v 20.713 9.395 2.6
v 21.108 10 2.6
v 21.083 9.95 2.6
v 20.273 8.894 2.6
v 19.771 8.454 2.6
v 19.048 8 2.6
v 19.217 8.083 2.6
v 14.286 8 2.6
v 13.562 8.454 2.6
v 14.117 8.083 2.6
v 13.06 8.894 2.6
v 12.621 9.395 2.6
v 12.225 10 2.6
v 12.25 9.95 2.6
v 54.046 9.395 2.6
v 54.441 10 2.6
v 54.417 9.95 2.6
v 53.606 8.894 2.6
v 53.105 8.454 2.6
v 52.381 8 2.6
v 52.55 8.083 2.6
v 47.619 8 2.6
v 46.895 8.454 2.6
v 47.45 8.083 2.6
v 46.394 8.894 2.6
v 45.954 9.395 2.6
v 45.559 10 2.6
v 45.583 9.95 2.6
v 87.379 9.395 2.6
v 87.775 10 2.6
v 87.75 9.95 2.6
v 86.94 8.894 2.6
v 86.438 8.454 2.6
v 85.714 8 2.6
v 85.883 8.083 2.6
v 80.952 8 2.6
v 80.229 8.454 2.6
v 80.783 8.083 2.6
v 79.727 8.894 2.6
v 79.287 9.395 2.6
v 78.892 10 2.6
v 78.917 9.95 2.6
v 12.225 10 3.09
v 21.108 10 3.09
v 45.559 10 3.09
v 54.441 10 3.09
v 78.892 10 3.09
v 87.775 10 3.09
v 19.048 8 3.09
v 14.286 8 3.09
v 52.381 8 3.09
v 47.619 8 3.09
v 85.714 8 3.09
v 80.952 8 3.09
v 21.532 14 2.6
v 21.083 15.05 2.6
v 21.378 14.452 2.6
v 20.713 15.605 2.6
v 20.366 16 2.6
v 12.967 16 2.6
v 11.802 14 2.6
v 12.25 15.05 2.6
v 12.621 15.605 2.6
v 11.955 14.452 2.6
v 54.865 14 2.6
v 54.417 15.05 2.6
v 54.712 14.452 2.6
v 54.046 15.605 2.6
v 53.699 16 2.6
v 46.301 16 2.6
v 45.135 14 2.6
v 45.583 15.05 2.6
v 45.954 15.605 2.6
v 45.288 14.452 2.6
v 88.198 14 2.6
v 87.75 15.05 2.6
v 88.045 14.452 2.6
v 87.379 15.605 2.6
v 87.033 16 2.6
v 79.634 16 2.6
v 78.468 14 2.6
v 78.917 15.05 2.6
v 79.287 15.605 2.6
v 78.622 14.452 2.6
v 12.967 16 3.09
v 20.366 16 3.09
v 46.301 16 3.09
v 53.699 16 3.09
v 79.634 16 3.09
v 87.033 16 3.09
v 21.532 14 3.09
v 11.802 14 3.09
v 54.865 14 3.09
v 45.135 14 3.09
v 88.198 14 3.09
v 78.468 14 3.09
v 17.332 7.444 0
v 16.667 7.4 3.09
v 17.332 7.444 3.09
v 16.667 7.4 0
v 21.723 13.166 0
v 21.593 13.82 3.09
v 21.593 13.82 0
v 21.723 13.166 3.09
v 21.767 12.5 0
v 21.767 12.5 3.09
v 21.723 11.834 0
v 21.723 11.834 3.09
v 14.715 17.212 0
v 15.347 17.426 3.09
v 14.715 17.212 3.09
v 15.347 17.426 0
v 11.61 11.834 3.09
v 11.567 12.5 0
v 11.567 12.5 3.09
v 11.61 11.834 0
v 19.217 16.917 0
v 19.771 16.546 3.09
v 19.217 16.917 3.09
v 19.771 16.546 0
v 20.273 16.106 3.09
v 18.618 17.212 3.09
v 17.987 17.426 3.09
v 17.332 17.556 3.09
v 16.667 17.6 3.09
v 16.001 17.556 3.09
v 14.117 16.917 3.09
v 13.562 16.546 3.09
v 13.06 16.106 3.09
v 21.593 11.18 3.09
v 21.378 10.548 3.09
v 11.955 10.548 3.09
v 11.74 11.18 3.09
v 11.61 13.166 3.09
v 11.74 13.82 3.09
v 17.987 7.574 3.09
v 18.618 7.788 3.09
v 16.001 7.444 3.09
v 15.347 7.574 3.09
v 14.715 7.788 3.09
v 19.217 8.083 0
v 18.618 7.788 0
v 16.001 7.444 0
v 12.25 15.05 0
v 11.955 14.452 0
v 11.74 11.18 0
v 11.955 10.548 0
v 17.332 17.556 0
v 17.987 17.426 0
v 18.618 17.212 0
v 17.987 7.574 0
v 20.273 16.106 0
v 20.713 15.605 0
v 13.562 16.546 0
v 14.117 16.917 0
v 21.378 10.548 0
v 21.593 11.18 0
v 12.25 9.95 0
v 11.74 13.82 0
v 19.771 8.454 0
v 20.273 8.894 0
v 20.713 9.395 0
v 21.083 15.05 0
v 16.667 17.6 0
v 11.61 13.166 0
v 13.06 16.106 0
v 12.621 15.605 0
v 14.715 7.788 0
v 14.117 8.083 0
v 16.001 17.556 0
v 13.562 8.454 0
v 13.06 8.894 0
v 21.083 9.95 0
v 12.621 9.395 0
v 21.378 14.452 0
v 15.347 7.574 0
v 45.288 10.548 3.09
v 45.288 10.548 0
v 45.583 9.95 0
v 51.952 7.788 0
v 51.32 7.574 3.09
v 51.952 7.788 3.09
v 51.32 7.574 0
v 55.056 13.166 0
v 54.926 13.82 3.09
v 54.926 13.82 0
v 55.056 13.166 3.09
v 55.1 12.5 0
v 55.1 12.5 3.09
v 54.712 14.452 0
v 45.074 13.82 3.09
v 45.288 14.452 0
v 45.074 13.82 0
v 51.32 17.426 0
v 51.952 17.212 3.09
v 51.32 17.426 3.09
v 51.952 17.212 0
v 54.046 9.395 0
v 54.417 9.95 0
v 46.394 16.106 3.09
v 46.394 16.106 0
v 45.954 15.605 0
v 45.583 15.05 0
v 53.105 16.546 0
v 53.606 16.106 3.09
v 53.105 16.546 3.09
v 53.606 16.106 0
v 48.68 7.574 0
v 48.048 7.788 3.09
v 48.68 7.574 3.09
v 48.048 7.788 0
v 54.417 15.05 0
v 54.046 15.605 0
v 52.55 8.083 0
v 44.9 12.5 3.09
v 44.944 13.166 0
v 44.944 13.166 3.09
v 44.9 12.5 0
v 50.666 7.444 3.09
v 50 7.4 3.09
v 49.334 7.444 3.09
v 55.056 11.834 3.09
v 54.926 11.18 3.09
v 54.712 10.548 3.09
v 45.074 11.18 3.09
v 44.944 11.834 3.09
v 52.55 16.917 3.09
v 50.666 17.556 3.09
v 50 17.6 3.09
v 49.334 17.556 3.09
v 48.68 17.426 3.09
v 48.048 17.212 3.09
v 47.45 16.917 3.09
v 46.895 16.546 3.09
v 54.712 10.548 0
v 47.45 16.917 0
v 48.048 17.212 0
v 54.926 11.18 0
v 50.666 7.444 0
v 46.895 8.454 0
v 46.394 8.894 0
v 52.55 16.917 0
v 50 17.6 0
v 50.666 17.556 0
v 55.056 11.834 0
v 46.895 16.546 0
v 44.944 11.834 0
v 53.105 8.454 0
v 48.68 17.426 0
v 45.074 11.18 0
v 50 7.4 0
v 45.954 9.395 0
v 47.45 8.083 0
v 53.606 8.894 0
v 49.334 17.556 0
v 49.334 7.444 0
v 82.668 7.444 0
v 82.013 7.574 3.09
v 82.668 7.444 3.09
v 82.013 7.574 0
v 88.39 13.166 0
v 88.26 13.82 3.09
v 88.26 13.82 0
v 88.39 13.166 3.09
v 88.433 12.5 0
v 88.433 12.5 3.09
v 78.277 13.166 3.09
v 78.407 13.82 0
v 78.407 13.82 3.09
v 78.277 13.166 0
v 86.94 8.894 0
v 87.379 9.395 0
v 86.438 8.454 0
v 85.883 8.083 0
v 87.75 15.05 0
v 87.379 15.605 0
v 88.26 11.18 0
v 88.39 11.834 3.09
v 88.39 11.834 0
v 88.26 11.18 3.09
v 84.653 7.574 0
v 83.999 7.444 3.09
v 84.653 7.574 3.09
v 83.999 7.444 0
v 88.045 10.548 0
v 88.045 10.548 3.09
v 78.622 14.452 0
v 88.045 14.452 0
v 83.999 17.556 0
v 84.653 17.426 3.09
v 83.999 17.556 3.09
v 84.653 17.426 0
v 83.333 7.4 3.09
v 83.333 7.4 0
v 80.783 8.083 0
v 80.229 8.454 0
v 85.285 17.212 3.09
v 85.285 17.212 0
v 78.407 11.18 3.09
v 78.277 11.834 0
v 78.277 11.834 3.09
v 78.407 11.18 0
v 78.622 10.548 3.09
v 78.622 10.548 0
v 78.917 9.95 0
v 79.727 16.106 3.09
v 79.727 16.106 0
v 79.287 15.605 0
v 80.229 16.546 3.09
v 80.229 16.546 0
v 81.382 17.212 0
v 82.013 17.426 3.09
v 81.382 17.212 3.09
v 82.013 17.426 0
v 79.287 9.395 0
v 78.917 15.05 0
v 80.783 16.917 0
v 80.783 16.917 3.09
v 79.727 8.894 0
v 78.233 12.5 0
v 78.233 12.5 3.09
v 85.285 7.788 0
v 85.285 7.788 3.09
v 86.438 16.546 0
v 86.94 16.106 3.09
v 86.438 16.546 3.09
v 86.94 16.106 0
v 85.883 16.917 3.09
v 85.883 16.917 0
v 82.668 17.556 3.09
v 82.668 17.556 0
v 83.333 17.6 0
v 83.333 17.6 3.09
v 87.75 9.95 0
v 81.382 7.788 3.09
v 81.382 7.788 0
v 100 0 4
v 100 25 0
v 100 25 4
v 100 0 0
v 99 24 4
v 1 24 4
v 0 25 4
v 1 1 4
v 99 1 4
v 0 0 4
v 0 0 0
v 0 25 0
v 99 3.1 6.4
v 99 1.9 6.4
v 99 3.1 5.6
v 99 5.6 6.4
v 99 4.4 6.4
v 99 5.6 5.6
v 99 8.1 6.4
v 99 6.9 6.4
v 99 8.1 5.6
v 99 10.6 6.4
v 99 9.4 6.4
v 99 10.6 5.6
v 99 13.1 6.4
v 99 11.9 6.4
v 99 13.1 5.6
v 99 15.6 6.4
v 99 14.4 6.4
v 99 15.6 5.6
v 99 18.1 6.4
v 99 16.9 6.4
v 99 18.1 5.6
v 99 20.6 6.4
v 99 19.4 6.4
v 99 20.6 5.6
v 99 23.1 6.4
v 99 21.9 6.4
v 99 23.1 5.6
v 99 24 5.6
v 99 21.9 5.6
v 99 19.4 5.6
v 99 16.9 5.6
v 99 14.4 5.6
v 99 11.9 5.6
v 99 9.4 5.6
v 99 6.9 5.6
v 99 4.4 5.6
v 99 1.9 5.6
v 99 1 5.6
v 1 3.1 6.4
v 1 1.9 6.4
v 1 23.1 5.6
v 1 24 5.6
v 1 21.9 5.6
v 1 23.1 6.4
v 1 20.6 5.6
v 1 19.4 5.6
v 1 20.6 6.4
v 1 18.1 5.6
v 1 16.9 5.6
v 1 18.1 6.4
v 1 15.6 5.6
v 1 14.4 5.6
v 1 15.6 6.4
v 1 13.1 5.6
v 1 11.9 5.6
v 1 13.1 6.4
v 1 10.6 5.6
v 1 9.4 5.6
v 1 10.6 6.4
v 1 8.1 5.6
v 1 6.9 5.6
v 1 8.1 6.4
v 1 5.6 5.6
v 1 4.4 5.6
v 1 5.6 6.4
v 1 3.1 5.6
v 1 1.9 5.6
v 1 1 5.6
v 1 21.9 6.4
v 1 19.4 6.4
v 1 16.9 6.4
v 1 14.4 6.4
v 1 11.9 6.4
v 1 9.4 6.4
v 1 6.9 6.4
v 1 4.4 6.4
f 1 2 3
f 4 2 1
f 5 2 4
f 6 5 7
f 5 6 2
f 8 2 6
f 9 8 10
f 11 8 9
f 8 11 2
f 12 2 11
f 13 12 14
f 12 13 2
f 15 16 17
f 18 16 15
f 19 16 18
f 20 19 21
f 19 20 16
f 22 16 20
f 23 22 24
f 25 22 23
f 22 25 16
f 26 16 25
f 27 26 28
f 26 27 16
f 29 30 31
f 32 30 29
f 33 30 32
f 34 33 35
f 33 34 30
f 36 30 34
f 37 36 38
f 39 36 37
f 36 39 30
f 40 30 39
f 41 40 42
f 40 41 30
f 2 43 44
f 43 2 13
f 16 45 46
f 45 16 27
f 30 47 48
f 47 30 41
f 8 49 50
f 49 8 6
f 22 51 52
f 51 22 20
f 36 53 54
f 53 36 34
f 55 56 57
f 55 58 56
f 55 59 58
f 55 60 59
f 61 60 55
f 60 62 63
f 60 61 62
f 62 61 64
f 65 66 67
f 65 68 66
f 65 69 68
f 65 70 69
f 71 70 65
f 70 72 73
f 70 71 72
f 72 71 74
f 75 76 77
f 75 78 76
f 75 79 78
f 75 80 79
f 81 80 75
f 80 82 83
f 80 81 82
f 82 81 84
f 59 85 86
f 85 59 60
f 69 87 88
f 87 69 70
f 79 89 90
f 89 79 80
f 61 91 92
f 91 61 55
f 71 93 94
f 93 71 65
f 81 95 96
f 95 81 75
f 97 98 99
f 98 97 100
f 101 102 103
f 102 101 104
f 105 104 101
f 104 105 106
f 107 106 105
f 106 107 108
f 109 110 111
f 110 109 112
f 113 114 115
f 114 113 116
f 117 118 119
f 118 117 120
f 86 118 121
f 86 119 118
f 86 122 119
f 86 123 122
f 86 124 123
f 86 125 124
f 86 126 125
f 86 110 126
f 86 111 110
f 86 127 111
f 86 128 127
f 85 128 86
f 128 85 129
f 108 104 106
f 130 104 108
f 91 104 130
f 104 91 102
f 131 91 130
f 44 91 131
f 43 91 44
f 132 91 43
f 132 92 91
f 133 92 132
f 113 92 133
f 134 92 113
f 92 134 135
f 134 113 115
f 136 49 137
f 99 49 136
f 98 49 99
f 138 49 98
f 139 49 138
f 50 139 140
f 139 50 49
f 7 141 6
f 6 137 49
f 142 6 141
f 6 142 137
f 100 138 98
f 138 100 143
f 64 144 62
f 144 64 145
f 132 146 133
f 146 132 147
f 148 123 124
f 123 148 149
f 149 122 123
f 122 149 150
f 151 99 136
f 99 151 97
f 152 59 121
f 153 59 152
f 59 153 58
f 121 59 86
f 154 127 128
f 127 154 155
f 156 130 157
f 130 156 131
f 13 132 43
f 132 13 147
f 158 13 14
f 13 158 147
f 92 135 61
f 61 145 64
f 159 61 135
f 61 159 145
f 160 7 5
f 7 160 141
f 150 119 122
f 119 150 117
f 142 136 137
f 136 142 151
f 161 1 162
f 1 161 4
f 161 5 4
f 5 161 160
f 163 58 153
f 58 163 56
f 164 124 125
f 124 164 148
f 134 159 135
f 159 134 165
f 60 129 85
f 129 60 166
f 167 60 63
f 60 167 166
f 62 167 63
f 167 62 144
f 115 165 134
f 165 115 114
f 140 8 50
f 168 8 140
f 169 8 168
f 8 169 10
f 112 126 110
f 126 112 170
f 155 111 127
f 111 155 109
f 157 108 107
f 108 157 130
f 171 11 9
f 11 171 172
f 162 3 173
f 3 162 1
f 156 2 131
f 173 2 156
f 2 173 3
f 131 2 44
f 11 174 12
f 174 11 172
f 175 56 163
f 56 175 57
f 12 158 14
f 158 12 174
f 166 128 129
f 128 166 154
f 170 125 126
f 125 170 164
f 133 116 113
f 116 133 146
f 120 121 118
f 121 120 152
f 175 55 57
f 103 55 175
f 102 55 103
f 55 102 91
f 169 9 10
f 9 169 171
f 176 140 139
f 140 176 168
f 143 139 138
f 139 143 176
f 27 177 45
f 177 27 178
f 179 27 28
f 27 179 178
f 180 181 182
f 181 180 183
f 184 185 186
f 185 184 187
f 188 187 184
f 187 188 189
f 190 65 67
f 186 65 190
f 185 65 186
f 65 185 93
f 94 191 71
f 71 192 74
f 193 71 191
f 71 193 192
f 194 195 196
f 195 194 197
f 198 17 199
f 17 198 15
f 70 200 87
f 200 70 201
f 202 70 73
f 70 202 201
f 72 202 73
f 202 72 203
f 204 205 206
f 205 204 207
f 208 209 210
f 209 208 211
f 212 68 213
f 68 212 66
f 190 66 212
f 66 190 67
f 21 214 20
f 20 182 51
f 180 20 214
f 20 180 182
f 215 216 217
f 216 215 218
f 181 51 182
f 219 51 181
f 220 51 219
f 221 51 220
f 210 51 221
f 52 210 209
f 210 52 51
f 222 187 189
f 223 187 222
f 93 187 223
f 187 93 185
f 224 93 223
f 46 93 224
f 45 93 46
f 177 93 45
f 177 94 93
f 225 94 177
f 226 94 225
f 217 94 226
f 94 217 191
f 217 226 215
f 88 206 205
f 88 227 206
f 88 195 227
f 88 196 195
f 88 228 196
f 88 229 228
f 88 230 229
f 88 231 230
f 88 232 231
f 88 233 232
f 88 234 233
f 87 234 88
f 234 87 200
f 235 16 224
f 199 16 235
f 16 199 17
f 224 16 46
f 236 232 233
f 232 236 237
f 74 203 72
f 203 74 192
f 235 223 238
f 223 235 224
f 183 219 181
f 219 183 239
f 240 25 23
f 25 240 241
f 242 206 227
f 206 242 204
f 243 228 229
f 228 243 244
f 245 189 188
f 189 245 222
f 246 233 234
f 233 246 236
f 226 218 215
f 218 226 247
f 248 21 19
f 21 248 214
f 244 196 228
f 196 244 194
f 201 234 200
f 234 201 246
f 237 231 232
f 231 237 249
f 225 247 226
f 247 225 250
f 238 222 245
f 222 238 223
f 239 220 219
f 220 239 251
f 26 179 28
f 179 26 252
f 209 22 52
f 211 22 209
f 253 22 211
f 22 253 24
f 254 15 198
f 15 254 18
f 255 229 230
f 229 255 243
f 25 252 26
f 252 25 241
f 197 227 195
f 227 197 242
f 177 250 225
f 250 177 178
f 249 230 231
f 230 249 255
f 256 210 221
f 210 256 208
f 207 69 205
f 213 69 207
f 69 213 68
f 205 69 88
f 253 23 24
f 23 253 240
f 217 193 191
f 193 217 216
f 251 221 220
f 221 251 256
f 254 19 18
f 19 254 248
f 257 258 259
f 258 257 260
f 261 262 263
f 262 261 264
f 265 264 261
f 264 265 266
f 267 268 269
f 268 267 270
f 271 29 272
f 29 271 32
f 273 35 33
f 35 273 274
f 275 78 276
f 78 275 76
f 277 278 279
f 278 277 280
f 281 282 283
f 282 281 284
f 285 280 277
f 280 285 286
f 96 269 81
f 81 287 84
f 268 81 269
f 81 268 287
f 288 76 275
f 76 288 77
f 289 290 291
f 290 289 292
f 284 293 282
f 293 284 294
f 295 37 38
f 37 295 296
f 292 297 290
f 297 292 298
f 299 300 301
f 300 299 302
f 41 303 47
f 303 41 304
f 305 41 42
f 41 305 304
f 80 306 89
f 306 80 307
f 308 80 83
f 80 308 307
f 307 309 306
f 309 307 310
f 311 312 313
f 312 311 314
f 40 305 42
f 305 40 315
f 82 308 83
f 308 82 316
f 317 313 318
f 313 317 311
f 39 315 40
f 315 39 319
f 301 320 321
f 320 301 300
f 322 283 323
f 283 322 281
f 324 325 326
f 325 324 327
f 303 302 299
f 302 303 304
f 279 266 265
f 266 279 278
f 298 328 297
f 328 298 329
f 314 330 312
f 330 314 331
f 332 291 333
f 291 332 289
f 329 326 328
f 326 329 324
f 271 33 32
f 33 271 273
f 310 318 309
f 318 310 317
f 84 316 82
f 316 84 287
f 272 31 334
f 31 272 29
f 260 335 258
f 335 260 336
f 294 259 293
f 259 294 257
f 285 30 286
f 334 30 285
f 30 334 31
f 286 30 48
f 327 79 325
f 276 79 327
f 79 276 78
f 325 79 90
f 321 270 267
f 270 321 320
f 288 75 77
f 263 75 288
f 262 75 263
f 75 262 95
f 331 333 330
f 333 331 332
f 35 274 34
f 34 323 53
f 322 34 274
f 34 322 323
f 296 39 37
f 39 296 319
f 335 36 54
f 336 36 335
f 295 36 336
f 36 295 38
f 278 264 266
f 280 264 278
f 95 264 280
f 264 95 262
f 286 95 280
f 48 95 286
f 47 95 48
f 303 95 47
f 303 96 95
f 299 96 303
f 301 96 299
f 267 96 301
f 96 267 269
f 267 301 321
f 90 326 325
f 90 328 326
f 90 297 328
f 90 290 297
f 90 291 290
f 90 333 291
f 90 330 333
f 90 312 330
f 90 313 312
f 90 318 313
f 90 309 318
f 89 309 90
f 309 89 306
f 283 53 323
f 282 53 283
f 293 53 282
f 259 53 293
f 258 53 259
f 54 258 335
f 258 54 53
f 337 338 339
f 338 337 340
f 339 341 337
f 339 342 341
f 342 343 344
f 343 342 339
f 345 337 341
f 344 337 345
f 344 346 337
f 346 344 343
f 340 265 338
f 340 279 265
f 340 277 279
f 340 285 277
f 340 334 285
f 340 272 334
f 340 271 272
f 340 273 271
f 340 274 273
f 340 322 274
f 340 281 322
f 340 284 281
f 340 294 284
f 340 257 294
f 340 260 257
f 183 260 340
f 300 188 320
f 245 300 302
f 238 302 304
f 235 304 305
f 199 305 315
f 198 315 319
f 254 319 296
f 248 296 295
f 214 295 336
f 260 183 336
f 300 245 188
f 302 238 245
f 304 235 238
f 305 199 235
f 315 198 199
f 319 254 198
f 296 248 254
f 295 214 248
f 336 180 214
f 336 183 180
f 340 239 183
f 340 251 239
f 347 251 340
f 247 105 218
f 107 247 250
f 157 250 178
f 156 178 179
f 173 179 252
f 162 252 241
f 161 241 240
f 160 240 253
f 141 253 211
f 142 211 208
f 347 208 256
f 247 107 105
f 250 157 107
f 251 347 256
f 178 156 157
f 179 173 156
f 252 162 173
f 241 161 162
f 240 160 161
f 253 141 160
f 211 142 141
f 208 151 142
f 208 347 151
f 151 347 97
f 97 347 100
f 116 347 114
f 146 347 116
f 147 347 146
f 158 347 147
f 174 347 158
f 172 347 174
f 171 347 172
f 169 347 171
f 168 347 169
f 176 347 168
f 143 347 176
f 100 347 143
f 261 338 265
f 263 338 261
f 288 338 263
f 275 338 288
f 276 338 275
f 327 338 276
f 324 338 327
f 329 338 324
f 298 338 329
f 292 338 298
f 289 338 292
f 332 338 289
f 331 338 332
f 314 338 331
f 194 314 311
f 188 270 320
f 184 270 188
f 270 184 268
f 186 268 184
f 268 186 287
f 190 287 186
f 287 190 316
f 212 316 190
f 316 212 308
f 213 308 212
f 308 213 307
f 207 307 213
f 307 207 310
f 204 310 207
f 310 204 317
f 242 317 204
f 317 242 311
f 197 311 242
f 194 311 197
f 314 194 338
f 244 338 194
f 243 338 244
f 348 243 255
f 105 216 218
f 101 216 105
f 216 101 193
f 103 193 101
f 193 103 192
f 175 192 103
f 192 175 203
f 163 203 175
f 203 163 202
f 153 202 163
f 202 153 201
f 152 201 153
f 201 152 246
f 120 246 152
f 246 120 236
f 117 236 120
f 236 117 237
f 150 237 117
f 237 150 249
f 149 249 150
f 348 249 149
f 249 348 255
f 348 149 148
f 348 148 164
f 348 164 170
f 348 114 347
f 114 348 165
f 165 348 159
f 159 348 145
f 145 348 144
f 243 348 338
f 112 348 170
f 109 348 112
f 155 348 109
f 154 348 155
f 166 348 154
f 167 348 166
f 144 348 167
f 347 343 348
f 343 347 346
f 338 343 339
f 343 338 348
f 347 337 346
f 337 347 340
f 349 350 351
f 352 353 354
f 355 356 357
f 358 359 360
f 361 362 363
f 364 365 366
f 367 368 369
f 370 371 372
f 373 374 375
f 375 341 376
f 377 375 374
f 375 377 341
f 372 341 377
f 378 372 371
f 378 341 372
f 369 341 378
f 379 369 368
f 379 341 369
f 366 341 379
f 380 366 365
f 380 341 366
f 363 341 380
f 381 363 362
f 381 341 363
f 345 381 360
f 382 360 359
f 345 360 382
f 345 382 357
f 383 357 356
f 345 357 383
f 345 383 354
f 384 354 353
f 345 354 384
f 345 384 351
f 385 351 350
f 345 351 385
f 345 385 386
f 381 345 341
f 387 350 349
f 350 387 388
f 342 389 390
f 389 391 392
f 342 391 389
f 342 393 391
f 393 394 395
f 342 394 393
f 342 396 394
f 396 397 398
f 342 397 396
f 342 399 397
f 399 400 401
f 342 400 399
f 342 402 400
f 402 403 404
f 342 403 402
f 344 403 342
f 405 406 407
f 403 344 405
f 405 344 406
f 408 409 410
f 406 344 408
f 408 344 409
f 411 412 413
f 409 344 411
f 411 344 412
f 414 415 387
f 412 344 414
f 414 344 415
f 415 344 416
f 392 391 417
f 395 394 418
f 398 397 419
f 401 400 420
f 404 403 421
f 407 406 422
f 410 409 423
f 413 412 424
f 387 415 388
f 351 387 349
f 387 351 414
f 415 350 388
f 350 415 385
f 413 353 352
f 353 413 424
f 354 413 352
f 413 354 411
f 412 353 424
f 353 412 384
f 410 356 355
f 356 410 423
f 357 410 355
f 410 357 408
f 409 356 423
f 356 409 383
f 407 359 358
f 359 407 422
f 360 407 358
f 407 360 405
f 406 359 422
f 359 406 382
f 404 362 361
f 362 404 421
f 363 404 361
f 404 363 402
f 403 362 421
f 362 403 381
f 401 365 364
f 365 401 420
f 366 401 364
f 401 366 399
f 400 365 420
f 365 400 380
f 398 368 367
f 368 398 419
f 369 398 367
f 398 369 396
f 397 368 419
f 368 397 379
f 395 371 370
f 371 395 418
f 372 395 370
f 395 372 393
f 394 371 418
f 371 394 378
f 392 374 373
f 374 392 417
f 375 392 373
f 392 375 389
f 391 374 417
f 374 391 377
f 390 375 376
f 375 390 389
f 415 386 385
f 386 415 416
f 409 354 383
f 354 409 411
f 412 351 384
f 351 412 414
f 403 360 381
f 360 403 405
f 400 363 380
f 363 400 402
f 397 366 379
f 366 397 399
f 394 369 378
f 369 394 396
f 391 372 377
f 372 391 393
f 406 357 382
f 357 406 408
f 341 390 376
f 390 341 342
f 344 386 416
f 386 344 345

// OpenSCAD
// Magnetic soft jaw for a bench vise: rigid plate + TPU face, in one print
// rigidflex by garage78 · CC BY 4.0
//
// Holds painted, chromed or 3D-printed parts without marking them.
// Print it as modelled (back face on the plate): the TPU face is printed on top of the
// rigid plate, which is exactly the "TPU on rigid" lap bond measured in series B.
// The rigid face has keying grooves that the TPU fills, so it holds mechanically as well.
// Press 10 x 3 mm disc magnets into the pockets on the back after printing.

part = "both";          // ["both", "rigid", "flex"]
jaw_w   = 100;          // mm, vise jaw width
jaw_h   = 25;           // mm, jaw height
plate_t = 4;            // mm, rigid plate
pad_t   = 2.4;          // mm, TPU pad above the plate
face    = "ribbed";     // ["smooth", "ribbed"]
groove_pitch = 6;       // mm, keying grooves under the TPU
groove_w = 2;  groove_d = 1.4;
magnet_d = 10.2; magnet_t = 3.1; magnets = 3;
$fn = 48;

module grooves() {
    for (y = [groove_pitch/2 : groove_pitch : jaw_h - groove_pitch/2 + 0.01])
        translate([3, y - groove_w/2, plate_t - groove_d]) cube([jaw_w - 6, groove_w, groove_d + 0.01]);
}
module rigid() {
    difference() {
        cube([jaw_w, jaw_h, plate_t]);
        grooves();
        for (i = [0:magnets-1]) translate([jaw_w*(i + 0.5)/magnets, jaw_h/2, -0.01]) cylinder(d=magnet_d, h=magnet_t);
    }
}
module flex() {
    union() {
        translate([1, 1, plate_t]) cube([jaw_w - 2, jaw_h - 2, pad_t - (face == "ribbed" ? 0.8 : 0)]);
        if (face == "ribbed")
            for (y = [2.5 : 2.5 : jaw_h - 2.5]) translate([1, y - 0.6, plate_t + pad_t - 0.8 - 0.01]) cube([jaw_w - 2, 1.2, 0.81]);
        intersection() { grooves(); translate([0, 0, 0]) cube([jaw_w, jaw_h, plate_t + 0.01]); }  // TPU keys in the grooves
    }
}
if (part != "flex")  color("SteelBlue") rigid();
if (part != "rigid") color("Orange")    flex();
